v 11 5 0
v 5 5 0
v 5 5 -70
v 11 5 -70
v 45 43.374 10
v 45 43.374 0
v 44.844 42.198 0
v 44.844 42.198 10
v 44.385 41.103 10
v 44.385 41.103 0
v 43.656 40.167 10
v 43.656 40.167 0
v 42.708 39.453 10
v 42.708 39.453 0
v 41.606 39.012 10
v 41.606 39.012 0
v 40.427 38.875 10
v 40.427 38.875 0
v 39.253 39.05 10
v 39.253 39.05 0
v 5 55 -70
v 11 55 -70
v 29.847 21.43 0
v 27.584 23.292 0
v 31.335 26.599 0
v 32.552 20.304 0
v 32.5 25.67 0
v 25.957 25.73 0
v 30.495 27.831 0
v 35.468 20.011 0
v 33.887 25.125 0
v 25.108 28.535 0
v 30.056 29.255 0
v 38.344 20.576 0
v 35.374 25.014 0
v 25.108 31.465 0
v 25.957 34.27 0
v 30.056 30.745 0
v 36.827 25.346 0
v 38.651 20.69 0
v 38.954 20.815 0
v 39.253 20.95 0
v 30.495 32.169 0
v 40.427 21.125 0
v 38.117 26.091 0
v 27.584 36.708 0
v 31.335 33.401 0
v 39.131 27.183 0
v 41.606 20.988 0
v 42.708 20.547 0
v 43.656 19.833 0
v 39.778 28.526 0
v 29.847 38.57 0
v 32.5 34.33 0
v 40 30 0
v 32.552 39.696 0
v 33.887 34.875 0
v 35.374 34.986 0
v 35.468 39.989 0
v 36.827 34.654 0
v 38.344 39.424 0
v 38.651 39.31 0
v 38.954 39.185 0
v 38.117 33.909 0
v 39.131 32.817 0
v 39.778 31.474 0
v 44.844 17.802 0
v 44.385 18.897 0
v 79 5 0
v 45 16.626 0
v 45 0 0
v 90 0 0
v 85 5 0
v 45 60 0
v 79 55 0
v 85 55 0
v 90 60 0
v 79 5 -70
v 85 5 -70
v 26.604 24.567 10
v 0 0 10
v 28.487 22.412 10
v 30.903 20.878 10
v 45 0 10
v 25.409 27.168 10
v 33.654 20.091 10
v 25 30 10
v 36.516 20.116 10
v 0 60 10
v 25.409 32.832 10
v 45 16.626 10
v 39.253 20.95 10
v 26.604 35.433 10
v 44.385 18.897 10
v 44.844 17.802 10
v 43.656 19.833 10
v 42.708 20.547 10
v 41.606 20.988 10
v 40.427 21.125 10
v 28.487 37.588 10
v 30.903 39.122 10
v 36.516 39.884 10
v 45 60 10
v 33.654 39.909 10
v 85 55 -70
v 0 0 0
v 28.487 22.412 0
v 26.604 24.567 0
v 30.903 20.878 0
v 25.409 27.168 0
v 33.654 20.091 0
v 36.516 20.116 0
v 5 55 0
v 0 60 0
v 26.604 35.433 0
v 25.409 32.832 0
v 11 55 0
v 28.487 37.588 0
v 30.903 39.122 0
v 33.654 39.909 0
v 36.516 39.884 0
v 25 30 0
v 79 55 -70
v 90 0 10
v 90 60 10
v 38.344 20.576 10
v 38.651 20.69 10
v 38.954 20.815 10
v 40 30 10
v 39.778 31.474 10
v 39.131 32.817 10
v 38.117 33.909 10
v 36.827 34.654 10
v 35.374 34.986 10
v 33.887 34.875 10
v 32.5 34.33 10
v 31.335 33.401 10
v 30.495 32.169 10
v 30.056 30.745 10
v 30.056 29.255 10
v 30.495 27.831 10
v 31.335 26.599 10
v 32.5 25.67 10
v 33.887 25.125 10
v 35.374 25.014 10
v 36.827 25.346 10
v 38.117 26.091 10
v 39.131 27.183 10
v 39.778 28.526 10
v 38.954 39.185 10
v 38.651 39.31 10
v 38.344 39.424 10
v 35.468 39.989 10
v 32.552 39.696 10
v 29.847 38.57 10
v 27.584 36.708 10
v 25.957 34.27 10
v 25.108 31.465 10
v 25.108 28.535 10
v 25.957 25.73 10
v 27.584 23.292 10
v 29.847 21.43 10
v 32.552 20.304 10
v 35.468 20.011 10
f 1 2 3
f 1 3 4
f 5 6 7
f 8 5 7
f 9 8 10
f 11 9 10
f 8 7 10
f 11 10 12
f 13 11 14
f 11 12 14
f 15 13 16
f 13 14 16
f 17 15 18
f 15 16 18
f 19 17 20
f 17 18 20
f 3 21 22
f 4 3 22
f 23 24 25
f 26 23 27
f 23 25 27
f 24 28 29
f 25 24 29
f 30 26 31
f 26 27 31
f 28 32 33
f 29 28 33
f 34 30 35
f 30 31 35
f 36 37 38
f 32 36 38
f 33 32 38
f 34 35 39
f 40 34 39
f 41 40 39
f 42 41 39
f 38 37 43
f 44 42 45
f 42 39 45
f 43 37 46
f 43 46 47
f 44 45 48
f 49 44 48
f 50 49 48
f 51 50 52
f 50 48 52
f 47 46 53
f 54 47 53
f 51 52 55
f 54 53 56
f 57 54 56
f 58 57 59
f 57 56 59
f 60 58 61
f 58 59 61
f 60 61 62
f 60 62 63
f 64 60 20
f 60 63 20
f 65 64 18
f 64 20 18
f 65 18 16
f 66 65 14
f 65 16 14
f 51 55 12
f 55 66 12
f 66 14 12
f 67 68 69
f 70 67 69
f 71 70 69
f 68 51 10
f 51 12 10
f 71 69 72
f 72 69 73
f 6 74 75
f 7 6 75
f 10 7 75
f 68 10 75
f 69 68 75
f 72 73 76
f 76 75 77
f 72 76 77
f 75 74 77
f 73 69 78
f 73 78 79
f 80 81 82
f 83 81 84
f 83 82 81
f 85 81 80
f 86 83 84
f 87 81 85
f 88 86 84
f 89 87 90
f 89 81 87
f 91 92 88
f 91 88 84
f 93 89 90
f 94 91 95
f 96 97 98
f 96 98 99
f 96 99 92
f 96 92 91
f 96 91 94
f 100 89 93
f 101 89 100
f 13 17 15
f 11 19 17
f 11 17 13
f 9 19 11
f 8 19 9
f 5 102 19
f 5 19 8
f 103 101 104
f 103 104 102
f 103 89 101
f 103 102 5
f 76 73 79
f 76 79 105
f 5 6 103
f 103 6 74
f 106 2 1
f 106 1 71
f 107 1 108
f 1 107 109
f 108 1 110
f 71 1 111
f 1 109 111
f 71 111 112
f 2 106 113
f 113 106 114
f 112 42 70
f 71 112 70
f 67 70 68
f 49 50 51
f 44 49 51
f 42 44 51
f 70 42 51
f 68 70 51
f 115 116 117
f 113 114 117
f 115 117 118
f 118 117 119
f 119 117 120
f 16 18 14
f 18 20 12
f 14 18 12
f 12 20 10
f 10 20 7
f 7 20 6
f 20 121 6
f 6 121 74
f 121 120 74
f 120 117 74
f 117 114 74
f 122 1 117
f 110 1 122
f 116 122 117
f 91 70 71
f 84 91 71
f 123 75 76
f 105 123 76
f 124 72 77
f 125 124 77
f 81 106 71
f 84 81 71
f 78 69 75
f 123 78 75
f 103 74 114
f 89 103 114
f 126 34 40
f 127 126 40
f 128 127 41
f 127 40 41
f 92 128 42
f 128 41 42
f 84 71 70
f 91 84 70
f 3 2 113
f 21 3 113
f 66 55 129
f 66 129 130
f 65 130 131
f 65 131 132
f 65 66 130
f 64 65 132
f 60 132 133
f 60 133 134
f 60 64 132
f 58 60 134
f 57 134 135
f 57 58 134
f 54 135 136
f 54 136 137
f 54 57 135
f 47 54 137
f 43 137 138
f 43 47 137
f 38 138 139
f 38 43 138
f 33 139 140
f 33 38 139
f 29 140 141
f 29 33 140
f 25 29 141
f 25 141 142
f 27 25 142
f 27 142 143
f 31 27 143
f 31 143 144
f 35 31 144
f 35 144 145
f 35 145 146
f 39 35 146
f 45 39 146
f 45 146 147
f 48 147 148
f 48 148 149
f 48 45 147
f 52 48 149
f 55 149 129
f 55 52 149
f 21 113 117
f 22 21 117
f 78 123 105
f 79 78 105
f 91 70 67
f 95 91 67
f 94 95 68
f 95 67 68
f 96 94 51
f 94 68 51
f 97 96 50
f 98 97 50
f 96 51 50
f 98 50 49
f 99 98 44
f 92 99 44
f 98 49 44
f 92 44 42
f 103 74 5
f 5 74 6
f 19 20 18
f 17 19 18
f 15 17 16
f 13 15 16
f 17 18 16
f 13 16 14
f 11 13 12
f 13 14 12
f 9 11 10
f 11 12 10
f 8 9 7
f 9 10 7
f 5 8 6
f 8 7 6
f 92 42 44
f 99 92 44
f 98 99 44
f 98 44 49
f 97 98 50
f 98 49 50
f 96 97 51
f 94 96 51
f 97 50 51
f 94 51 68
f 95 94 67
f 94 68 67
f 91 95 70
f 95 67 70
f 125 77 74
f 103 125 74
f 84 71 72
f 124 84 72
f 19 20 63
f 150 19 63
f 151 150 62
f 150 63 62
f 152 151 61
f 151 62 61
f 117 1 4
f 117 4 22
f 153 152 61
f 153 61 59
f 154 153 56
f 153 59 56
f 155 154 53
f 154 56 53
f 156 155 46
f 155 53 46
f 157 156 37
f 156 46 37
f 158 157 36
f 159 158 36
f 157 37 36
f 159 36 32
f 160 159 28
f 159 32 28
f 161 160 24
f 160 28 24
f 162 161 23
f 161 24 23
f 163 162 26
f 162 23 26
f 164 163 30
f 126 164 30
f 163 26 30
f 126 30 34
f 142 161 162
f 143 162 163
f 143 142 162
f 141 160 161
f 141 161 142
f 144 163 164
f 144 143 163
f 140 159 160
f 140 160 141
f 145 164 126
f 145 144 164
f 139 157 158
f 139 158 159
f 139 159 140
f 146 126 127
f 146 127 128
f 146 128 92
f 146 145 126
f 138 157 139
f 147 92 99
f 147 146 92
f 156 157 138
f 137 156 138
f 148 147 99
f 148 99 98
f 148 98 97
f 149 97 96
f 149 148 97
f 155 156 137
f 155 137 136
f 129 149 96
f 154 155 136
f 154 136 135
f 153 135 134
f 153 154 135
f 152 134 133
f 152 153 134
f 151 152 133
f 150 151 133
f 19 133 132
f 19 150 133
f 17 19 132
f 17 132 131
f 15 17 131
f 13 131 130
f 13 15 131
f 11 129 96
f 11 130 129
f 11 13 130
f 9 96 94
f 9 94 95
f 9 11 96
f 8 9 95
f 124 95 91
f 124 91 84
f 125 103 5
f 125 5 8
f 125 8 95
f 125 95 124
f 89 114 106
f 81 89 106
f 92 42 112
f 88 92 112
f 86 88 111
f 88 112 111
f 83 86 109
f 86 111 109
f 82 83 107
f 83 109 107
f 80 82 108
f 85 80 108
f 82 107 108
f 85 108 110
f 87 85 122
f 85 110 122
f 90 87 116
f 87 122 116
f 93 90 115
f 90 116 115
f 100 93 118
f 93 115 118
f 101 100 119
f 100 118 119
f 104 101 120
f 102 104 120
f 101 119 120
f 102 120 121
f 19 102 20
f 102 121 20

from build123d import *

# Parameters (mm, degrees)
F1_DEPTH = 10
F2_R     = 5
F3_DEPTH = 10
F4_W     = 6
F4_H     = 50
F5_DEPTH = 70


with BuildPart() as f1:
    # F0 (on Top) → F1 (new body)
    with BuildSketch(Plane.XY):
        with BuildLine():
            Line((0, 60), (0, 0))
            Line((0, 0), (45, 0))
            Line((45, 0), (45, 16.625795157))
            ThreePointArc((45, 16.625795157), (43.2056172384, 20.2215753726), (39.2534953958, 20.9497084623))
            ThreePointArc((39.2534953958, 20.9497084623), (25, 30), (39.2534953958, 39.0502915377))
            ThreePointArc((39.2534953958, 39.0502915377), (43.2056172384, 39.7784246274), (45, 43.374204843))
            Line((45, 43.374204843), (45, 60))
            Line((45, 60), (0, 60))
        make_face()
    extrude(amount=F1_DEPTH)

    # F4 (on Top) → F5 (join)
    with BuildSketch(Plane.XY):
        with Locations((8, 30)):
            Rectangle(F4_W, F4_H)
    extrude(amount=-F5_DEPTH)


with BuildPart() as f3:
    # F2 (on Top) → F3 (new body)
    with BuildSketch(Plane.XY):
        with BuildLine():
            ThreePointArc((38.3439909876, 39.4243155866), (38.788495333, 39.2123841147), (39.2534953958, 39.0502915377))
            ThreePointArc((39.2534953958, 39.0502915377), (38.8033437044, 39.2484905074), (38.3439909876, 39.4243155866))
        make_face()
        with BuildLine():
            ThreePointArc((45, 43.374204843), (43.2056172384, 39.7784246274), (39.2534953958, 39.0502915377))
            ThreePointArc((39.2534953958, 39.0502915377), (38.788495333, 39.2123841147), (38.3439909876, 39.4243155866))
            ThreePointArc((38.3439909876, 39.4243155866), (25, 30), (38.3439909876, 20.5756844134))
            ThreePointArc((38.3439909876, 20.5756844134), (38.788495333, 20.7876158853), (39.2534953958, 20.9497084623))
            ThreePointArc((39.2534953958, 20.9497084623), (43.2056172384, 20.2215753726), (45, 16.625795157))
            Line((45, 16.625795157), (45, 0))
            Line((45, 0), (90, 0))
            Line((90, 0), (90, 60))
            Line((90, 60), (45, 60))
            Line((45, 60), (45, 43.374204843))
        make_face()
        with Locations((35, 30)):
            Circle(F2_R, mode=Mode.SUBTRACT)
        with BuildLine():
            ThreePointArc((39.2534953958, 20.9497084623), (38.788495333, 20.7876158853), (38.3439909876, 20.5756844134))
            ThreePointArc((38.3439909876, 20.5756844134), (38.8033437044, 20.7515094926), (39.2534953958, 20.9497084623))
        make_face()
    extrude(amount=F3_DEPTH)

    # F4 (on Top) → F5, piece 2 (join)
    with BuildSketch(Plane.XY):
        with Locations((82, 30)):
            Rectangle(F4_W, F4_H)
    extrude(amount=-F5_DEPTH)


solid = Compound([f1.part, f3.part])
